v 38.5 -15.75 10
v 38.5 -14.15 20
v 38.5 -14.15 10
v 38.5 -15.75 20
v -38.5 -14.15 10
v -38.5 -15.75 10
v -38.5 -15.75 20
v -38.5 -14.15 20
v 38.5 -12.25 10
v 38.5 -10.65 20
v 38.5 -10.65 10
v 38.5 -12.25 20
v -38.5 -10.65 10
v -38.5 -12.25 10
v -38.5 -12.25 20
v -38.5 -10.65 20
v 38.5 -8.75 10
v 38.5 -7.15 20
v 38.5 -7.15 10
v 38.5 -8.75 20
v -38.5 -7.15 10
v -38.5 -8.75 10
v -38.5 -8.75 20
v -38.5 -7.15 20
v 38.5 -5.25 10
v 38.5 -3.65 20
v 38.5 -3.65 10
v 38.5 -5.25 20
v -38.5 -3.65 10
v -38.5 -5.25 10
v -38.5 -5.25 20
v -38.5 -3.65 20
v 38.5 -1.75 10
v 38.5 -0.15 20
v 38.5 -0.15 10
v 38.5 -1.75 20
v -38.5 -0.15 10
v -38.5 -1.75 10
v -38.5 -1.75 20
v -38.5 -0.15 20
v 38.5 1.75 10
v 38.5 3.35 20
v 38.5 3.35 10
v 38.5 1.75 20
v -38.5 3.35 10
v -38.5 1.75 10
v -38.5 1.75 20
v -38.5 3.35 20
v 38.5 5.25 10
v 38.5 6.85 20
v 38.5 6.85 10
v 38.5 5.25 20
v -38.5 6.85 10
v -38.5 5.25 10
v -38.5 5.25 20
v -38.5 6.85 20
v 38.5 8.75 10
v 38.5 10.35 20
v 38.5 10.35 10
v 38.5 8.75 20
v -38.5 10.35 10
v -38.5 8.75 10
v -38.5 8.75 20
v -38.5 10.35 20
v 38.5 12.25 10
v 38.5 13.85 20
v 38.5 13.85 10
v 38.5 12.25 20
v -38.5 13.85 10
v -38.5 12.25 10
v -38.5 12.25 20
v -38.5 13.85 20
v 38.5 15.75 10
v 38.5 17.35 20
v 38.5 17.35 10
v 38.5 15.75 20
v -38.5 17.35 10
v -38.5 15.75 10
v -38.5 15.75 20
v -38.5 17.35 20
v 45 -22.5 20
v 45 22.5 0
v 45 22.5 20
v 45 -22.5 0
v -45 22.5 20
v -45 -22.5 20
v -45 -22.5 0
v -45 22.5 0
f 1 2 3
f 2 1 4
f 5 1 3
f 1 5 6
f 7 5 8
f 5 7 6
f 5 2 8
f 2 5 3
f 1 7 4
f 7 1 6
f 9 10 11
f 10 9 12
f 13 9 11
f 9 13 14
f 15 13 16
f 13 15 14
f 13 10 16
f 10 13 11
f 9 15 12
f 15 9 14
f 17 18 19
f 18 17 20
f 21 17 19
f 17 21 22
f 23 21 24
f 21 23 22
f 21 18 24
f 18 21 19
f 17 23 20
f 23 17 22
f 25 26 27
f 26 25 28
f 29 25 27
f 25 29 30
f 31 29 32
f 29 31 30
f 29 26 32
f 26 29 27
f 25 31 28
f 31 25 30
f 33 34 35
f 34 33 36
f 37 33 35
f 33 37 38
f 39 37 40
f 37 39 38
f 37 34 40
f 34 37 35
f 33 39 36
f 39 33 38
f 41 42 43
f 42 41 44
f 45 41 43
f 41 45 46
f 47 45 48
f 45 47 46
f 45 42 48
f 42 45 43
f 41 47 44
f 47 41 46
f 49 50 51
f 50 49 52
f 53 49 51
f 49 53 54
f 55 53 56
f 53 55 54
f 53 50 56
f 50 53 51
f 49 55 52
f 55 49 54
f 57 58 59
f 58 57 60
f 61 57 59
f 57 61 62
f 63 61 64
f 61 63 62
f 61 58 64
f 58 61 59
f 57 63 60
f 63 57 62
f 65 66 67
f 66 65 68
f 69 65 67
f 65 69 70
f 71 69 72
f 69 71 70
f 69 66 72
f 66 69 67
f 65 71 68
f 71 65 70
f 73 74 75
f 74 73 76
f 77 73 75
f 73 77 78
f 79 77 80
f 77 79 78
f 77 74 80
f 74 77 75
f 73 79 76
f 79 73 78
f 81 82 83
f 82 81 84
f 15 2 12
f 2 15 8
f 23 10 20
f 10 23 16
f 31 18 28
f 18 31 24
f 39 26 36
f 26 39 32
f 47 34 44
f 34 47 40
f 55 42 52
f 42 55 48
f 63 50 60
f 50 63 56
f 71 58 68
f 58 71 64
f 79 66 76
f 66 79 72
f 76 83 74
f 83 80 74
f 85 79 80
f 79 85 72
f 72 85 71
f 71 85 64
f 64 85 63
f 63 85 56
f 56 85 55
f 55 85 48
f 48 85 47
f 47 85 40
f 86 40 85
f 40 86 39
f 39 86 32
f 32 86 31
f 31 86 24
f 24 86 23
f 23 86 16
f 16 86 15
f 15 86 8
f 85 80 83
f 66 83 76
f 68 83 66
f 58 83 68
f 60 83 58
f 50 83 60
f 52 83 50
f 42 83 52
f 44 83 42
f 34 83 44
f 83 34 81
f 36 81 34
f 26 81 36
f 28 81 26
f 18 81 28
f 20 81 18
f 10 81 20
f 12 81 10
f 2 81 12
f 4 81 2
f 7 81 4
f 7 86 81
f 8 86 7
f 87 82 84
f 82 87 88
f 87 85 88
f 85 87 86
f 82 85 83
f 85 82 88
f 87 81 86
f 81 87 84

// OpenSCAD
// Slide drying rack - holds 10 microscope slides standing upright on their long edge
// Units: mm. Print orientation: base on XY plane, slots open upward (+Z).

// ---- Block ----
block_len   = 90;    // block length along X
block_wid   = 45;    // block width along Y
block_ht    = 20;    // block height along Z

// ---- Slots ----
slot_count  = 10;    // number of slide slots
slot_len    = 77;    // slot length along X (slide length + clearance)
slot_w      = 1.6;   // slot width along Y
slot_depth  = 10;    // slot depth from top face
slot_pitch  = 3.5;   // centre-to-centre spacing of slots along Y

// ---- Misc ----
eps         = 0.5;   // overcut past the top face so cuts are not coplanar
$fn         = 64;    // curve resolution (no curved features here)

difference() {
    // Base block, centred in X and Y
    translate([-block_len/2, -block_wid/2, 0])
        cube([block_len, block_wid, block_ht]);

    // Slot group, centred on the block in X and Y
    for (i = [0 : slot_count - 1]) {
        y = (i - (slot_count - 1)/2) * slot_pitch;
        translate([-slot_len/2, y, block_ht - slot_depth])
            cube([slot_len, slot_w, slot_depth + eps]);
    }
}
